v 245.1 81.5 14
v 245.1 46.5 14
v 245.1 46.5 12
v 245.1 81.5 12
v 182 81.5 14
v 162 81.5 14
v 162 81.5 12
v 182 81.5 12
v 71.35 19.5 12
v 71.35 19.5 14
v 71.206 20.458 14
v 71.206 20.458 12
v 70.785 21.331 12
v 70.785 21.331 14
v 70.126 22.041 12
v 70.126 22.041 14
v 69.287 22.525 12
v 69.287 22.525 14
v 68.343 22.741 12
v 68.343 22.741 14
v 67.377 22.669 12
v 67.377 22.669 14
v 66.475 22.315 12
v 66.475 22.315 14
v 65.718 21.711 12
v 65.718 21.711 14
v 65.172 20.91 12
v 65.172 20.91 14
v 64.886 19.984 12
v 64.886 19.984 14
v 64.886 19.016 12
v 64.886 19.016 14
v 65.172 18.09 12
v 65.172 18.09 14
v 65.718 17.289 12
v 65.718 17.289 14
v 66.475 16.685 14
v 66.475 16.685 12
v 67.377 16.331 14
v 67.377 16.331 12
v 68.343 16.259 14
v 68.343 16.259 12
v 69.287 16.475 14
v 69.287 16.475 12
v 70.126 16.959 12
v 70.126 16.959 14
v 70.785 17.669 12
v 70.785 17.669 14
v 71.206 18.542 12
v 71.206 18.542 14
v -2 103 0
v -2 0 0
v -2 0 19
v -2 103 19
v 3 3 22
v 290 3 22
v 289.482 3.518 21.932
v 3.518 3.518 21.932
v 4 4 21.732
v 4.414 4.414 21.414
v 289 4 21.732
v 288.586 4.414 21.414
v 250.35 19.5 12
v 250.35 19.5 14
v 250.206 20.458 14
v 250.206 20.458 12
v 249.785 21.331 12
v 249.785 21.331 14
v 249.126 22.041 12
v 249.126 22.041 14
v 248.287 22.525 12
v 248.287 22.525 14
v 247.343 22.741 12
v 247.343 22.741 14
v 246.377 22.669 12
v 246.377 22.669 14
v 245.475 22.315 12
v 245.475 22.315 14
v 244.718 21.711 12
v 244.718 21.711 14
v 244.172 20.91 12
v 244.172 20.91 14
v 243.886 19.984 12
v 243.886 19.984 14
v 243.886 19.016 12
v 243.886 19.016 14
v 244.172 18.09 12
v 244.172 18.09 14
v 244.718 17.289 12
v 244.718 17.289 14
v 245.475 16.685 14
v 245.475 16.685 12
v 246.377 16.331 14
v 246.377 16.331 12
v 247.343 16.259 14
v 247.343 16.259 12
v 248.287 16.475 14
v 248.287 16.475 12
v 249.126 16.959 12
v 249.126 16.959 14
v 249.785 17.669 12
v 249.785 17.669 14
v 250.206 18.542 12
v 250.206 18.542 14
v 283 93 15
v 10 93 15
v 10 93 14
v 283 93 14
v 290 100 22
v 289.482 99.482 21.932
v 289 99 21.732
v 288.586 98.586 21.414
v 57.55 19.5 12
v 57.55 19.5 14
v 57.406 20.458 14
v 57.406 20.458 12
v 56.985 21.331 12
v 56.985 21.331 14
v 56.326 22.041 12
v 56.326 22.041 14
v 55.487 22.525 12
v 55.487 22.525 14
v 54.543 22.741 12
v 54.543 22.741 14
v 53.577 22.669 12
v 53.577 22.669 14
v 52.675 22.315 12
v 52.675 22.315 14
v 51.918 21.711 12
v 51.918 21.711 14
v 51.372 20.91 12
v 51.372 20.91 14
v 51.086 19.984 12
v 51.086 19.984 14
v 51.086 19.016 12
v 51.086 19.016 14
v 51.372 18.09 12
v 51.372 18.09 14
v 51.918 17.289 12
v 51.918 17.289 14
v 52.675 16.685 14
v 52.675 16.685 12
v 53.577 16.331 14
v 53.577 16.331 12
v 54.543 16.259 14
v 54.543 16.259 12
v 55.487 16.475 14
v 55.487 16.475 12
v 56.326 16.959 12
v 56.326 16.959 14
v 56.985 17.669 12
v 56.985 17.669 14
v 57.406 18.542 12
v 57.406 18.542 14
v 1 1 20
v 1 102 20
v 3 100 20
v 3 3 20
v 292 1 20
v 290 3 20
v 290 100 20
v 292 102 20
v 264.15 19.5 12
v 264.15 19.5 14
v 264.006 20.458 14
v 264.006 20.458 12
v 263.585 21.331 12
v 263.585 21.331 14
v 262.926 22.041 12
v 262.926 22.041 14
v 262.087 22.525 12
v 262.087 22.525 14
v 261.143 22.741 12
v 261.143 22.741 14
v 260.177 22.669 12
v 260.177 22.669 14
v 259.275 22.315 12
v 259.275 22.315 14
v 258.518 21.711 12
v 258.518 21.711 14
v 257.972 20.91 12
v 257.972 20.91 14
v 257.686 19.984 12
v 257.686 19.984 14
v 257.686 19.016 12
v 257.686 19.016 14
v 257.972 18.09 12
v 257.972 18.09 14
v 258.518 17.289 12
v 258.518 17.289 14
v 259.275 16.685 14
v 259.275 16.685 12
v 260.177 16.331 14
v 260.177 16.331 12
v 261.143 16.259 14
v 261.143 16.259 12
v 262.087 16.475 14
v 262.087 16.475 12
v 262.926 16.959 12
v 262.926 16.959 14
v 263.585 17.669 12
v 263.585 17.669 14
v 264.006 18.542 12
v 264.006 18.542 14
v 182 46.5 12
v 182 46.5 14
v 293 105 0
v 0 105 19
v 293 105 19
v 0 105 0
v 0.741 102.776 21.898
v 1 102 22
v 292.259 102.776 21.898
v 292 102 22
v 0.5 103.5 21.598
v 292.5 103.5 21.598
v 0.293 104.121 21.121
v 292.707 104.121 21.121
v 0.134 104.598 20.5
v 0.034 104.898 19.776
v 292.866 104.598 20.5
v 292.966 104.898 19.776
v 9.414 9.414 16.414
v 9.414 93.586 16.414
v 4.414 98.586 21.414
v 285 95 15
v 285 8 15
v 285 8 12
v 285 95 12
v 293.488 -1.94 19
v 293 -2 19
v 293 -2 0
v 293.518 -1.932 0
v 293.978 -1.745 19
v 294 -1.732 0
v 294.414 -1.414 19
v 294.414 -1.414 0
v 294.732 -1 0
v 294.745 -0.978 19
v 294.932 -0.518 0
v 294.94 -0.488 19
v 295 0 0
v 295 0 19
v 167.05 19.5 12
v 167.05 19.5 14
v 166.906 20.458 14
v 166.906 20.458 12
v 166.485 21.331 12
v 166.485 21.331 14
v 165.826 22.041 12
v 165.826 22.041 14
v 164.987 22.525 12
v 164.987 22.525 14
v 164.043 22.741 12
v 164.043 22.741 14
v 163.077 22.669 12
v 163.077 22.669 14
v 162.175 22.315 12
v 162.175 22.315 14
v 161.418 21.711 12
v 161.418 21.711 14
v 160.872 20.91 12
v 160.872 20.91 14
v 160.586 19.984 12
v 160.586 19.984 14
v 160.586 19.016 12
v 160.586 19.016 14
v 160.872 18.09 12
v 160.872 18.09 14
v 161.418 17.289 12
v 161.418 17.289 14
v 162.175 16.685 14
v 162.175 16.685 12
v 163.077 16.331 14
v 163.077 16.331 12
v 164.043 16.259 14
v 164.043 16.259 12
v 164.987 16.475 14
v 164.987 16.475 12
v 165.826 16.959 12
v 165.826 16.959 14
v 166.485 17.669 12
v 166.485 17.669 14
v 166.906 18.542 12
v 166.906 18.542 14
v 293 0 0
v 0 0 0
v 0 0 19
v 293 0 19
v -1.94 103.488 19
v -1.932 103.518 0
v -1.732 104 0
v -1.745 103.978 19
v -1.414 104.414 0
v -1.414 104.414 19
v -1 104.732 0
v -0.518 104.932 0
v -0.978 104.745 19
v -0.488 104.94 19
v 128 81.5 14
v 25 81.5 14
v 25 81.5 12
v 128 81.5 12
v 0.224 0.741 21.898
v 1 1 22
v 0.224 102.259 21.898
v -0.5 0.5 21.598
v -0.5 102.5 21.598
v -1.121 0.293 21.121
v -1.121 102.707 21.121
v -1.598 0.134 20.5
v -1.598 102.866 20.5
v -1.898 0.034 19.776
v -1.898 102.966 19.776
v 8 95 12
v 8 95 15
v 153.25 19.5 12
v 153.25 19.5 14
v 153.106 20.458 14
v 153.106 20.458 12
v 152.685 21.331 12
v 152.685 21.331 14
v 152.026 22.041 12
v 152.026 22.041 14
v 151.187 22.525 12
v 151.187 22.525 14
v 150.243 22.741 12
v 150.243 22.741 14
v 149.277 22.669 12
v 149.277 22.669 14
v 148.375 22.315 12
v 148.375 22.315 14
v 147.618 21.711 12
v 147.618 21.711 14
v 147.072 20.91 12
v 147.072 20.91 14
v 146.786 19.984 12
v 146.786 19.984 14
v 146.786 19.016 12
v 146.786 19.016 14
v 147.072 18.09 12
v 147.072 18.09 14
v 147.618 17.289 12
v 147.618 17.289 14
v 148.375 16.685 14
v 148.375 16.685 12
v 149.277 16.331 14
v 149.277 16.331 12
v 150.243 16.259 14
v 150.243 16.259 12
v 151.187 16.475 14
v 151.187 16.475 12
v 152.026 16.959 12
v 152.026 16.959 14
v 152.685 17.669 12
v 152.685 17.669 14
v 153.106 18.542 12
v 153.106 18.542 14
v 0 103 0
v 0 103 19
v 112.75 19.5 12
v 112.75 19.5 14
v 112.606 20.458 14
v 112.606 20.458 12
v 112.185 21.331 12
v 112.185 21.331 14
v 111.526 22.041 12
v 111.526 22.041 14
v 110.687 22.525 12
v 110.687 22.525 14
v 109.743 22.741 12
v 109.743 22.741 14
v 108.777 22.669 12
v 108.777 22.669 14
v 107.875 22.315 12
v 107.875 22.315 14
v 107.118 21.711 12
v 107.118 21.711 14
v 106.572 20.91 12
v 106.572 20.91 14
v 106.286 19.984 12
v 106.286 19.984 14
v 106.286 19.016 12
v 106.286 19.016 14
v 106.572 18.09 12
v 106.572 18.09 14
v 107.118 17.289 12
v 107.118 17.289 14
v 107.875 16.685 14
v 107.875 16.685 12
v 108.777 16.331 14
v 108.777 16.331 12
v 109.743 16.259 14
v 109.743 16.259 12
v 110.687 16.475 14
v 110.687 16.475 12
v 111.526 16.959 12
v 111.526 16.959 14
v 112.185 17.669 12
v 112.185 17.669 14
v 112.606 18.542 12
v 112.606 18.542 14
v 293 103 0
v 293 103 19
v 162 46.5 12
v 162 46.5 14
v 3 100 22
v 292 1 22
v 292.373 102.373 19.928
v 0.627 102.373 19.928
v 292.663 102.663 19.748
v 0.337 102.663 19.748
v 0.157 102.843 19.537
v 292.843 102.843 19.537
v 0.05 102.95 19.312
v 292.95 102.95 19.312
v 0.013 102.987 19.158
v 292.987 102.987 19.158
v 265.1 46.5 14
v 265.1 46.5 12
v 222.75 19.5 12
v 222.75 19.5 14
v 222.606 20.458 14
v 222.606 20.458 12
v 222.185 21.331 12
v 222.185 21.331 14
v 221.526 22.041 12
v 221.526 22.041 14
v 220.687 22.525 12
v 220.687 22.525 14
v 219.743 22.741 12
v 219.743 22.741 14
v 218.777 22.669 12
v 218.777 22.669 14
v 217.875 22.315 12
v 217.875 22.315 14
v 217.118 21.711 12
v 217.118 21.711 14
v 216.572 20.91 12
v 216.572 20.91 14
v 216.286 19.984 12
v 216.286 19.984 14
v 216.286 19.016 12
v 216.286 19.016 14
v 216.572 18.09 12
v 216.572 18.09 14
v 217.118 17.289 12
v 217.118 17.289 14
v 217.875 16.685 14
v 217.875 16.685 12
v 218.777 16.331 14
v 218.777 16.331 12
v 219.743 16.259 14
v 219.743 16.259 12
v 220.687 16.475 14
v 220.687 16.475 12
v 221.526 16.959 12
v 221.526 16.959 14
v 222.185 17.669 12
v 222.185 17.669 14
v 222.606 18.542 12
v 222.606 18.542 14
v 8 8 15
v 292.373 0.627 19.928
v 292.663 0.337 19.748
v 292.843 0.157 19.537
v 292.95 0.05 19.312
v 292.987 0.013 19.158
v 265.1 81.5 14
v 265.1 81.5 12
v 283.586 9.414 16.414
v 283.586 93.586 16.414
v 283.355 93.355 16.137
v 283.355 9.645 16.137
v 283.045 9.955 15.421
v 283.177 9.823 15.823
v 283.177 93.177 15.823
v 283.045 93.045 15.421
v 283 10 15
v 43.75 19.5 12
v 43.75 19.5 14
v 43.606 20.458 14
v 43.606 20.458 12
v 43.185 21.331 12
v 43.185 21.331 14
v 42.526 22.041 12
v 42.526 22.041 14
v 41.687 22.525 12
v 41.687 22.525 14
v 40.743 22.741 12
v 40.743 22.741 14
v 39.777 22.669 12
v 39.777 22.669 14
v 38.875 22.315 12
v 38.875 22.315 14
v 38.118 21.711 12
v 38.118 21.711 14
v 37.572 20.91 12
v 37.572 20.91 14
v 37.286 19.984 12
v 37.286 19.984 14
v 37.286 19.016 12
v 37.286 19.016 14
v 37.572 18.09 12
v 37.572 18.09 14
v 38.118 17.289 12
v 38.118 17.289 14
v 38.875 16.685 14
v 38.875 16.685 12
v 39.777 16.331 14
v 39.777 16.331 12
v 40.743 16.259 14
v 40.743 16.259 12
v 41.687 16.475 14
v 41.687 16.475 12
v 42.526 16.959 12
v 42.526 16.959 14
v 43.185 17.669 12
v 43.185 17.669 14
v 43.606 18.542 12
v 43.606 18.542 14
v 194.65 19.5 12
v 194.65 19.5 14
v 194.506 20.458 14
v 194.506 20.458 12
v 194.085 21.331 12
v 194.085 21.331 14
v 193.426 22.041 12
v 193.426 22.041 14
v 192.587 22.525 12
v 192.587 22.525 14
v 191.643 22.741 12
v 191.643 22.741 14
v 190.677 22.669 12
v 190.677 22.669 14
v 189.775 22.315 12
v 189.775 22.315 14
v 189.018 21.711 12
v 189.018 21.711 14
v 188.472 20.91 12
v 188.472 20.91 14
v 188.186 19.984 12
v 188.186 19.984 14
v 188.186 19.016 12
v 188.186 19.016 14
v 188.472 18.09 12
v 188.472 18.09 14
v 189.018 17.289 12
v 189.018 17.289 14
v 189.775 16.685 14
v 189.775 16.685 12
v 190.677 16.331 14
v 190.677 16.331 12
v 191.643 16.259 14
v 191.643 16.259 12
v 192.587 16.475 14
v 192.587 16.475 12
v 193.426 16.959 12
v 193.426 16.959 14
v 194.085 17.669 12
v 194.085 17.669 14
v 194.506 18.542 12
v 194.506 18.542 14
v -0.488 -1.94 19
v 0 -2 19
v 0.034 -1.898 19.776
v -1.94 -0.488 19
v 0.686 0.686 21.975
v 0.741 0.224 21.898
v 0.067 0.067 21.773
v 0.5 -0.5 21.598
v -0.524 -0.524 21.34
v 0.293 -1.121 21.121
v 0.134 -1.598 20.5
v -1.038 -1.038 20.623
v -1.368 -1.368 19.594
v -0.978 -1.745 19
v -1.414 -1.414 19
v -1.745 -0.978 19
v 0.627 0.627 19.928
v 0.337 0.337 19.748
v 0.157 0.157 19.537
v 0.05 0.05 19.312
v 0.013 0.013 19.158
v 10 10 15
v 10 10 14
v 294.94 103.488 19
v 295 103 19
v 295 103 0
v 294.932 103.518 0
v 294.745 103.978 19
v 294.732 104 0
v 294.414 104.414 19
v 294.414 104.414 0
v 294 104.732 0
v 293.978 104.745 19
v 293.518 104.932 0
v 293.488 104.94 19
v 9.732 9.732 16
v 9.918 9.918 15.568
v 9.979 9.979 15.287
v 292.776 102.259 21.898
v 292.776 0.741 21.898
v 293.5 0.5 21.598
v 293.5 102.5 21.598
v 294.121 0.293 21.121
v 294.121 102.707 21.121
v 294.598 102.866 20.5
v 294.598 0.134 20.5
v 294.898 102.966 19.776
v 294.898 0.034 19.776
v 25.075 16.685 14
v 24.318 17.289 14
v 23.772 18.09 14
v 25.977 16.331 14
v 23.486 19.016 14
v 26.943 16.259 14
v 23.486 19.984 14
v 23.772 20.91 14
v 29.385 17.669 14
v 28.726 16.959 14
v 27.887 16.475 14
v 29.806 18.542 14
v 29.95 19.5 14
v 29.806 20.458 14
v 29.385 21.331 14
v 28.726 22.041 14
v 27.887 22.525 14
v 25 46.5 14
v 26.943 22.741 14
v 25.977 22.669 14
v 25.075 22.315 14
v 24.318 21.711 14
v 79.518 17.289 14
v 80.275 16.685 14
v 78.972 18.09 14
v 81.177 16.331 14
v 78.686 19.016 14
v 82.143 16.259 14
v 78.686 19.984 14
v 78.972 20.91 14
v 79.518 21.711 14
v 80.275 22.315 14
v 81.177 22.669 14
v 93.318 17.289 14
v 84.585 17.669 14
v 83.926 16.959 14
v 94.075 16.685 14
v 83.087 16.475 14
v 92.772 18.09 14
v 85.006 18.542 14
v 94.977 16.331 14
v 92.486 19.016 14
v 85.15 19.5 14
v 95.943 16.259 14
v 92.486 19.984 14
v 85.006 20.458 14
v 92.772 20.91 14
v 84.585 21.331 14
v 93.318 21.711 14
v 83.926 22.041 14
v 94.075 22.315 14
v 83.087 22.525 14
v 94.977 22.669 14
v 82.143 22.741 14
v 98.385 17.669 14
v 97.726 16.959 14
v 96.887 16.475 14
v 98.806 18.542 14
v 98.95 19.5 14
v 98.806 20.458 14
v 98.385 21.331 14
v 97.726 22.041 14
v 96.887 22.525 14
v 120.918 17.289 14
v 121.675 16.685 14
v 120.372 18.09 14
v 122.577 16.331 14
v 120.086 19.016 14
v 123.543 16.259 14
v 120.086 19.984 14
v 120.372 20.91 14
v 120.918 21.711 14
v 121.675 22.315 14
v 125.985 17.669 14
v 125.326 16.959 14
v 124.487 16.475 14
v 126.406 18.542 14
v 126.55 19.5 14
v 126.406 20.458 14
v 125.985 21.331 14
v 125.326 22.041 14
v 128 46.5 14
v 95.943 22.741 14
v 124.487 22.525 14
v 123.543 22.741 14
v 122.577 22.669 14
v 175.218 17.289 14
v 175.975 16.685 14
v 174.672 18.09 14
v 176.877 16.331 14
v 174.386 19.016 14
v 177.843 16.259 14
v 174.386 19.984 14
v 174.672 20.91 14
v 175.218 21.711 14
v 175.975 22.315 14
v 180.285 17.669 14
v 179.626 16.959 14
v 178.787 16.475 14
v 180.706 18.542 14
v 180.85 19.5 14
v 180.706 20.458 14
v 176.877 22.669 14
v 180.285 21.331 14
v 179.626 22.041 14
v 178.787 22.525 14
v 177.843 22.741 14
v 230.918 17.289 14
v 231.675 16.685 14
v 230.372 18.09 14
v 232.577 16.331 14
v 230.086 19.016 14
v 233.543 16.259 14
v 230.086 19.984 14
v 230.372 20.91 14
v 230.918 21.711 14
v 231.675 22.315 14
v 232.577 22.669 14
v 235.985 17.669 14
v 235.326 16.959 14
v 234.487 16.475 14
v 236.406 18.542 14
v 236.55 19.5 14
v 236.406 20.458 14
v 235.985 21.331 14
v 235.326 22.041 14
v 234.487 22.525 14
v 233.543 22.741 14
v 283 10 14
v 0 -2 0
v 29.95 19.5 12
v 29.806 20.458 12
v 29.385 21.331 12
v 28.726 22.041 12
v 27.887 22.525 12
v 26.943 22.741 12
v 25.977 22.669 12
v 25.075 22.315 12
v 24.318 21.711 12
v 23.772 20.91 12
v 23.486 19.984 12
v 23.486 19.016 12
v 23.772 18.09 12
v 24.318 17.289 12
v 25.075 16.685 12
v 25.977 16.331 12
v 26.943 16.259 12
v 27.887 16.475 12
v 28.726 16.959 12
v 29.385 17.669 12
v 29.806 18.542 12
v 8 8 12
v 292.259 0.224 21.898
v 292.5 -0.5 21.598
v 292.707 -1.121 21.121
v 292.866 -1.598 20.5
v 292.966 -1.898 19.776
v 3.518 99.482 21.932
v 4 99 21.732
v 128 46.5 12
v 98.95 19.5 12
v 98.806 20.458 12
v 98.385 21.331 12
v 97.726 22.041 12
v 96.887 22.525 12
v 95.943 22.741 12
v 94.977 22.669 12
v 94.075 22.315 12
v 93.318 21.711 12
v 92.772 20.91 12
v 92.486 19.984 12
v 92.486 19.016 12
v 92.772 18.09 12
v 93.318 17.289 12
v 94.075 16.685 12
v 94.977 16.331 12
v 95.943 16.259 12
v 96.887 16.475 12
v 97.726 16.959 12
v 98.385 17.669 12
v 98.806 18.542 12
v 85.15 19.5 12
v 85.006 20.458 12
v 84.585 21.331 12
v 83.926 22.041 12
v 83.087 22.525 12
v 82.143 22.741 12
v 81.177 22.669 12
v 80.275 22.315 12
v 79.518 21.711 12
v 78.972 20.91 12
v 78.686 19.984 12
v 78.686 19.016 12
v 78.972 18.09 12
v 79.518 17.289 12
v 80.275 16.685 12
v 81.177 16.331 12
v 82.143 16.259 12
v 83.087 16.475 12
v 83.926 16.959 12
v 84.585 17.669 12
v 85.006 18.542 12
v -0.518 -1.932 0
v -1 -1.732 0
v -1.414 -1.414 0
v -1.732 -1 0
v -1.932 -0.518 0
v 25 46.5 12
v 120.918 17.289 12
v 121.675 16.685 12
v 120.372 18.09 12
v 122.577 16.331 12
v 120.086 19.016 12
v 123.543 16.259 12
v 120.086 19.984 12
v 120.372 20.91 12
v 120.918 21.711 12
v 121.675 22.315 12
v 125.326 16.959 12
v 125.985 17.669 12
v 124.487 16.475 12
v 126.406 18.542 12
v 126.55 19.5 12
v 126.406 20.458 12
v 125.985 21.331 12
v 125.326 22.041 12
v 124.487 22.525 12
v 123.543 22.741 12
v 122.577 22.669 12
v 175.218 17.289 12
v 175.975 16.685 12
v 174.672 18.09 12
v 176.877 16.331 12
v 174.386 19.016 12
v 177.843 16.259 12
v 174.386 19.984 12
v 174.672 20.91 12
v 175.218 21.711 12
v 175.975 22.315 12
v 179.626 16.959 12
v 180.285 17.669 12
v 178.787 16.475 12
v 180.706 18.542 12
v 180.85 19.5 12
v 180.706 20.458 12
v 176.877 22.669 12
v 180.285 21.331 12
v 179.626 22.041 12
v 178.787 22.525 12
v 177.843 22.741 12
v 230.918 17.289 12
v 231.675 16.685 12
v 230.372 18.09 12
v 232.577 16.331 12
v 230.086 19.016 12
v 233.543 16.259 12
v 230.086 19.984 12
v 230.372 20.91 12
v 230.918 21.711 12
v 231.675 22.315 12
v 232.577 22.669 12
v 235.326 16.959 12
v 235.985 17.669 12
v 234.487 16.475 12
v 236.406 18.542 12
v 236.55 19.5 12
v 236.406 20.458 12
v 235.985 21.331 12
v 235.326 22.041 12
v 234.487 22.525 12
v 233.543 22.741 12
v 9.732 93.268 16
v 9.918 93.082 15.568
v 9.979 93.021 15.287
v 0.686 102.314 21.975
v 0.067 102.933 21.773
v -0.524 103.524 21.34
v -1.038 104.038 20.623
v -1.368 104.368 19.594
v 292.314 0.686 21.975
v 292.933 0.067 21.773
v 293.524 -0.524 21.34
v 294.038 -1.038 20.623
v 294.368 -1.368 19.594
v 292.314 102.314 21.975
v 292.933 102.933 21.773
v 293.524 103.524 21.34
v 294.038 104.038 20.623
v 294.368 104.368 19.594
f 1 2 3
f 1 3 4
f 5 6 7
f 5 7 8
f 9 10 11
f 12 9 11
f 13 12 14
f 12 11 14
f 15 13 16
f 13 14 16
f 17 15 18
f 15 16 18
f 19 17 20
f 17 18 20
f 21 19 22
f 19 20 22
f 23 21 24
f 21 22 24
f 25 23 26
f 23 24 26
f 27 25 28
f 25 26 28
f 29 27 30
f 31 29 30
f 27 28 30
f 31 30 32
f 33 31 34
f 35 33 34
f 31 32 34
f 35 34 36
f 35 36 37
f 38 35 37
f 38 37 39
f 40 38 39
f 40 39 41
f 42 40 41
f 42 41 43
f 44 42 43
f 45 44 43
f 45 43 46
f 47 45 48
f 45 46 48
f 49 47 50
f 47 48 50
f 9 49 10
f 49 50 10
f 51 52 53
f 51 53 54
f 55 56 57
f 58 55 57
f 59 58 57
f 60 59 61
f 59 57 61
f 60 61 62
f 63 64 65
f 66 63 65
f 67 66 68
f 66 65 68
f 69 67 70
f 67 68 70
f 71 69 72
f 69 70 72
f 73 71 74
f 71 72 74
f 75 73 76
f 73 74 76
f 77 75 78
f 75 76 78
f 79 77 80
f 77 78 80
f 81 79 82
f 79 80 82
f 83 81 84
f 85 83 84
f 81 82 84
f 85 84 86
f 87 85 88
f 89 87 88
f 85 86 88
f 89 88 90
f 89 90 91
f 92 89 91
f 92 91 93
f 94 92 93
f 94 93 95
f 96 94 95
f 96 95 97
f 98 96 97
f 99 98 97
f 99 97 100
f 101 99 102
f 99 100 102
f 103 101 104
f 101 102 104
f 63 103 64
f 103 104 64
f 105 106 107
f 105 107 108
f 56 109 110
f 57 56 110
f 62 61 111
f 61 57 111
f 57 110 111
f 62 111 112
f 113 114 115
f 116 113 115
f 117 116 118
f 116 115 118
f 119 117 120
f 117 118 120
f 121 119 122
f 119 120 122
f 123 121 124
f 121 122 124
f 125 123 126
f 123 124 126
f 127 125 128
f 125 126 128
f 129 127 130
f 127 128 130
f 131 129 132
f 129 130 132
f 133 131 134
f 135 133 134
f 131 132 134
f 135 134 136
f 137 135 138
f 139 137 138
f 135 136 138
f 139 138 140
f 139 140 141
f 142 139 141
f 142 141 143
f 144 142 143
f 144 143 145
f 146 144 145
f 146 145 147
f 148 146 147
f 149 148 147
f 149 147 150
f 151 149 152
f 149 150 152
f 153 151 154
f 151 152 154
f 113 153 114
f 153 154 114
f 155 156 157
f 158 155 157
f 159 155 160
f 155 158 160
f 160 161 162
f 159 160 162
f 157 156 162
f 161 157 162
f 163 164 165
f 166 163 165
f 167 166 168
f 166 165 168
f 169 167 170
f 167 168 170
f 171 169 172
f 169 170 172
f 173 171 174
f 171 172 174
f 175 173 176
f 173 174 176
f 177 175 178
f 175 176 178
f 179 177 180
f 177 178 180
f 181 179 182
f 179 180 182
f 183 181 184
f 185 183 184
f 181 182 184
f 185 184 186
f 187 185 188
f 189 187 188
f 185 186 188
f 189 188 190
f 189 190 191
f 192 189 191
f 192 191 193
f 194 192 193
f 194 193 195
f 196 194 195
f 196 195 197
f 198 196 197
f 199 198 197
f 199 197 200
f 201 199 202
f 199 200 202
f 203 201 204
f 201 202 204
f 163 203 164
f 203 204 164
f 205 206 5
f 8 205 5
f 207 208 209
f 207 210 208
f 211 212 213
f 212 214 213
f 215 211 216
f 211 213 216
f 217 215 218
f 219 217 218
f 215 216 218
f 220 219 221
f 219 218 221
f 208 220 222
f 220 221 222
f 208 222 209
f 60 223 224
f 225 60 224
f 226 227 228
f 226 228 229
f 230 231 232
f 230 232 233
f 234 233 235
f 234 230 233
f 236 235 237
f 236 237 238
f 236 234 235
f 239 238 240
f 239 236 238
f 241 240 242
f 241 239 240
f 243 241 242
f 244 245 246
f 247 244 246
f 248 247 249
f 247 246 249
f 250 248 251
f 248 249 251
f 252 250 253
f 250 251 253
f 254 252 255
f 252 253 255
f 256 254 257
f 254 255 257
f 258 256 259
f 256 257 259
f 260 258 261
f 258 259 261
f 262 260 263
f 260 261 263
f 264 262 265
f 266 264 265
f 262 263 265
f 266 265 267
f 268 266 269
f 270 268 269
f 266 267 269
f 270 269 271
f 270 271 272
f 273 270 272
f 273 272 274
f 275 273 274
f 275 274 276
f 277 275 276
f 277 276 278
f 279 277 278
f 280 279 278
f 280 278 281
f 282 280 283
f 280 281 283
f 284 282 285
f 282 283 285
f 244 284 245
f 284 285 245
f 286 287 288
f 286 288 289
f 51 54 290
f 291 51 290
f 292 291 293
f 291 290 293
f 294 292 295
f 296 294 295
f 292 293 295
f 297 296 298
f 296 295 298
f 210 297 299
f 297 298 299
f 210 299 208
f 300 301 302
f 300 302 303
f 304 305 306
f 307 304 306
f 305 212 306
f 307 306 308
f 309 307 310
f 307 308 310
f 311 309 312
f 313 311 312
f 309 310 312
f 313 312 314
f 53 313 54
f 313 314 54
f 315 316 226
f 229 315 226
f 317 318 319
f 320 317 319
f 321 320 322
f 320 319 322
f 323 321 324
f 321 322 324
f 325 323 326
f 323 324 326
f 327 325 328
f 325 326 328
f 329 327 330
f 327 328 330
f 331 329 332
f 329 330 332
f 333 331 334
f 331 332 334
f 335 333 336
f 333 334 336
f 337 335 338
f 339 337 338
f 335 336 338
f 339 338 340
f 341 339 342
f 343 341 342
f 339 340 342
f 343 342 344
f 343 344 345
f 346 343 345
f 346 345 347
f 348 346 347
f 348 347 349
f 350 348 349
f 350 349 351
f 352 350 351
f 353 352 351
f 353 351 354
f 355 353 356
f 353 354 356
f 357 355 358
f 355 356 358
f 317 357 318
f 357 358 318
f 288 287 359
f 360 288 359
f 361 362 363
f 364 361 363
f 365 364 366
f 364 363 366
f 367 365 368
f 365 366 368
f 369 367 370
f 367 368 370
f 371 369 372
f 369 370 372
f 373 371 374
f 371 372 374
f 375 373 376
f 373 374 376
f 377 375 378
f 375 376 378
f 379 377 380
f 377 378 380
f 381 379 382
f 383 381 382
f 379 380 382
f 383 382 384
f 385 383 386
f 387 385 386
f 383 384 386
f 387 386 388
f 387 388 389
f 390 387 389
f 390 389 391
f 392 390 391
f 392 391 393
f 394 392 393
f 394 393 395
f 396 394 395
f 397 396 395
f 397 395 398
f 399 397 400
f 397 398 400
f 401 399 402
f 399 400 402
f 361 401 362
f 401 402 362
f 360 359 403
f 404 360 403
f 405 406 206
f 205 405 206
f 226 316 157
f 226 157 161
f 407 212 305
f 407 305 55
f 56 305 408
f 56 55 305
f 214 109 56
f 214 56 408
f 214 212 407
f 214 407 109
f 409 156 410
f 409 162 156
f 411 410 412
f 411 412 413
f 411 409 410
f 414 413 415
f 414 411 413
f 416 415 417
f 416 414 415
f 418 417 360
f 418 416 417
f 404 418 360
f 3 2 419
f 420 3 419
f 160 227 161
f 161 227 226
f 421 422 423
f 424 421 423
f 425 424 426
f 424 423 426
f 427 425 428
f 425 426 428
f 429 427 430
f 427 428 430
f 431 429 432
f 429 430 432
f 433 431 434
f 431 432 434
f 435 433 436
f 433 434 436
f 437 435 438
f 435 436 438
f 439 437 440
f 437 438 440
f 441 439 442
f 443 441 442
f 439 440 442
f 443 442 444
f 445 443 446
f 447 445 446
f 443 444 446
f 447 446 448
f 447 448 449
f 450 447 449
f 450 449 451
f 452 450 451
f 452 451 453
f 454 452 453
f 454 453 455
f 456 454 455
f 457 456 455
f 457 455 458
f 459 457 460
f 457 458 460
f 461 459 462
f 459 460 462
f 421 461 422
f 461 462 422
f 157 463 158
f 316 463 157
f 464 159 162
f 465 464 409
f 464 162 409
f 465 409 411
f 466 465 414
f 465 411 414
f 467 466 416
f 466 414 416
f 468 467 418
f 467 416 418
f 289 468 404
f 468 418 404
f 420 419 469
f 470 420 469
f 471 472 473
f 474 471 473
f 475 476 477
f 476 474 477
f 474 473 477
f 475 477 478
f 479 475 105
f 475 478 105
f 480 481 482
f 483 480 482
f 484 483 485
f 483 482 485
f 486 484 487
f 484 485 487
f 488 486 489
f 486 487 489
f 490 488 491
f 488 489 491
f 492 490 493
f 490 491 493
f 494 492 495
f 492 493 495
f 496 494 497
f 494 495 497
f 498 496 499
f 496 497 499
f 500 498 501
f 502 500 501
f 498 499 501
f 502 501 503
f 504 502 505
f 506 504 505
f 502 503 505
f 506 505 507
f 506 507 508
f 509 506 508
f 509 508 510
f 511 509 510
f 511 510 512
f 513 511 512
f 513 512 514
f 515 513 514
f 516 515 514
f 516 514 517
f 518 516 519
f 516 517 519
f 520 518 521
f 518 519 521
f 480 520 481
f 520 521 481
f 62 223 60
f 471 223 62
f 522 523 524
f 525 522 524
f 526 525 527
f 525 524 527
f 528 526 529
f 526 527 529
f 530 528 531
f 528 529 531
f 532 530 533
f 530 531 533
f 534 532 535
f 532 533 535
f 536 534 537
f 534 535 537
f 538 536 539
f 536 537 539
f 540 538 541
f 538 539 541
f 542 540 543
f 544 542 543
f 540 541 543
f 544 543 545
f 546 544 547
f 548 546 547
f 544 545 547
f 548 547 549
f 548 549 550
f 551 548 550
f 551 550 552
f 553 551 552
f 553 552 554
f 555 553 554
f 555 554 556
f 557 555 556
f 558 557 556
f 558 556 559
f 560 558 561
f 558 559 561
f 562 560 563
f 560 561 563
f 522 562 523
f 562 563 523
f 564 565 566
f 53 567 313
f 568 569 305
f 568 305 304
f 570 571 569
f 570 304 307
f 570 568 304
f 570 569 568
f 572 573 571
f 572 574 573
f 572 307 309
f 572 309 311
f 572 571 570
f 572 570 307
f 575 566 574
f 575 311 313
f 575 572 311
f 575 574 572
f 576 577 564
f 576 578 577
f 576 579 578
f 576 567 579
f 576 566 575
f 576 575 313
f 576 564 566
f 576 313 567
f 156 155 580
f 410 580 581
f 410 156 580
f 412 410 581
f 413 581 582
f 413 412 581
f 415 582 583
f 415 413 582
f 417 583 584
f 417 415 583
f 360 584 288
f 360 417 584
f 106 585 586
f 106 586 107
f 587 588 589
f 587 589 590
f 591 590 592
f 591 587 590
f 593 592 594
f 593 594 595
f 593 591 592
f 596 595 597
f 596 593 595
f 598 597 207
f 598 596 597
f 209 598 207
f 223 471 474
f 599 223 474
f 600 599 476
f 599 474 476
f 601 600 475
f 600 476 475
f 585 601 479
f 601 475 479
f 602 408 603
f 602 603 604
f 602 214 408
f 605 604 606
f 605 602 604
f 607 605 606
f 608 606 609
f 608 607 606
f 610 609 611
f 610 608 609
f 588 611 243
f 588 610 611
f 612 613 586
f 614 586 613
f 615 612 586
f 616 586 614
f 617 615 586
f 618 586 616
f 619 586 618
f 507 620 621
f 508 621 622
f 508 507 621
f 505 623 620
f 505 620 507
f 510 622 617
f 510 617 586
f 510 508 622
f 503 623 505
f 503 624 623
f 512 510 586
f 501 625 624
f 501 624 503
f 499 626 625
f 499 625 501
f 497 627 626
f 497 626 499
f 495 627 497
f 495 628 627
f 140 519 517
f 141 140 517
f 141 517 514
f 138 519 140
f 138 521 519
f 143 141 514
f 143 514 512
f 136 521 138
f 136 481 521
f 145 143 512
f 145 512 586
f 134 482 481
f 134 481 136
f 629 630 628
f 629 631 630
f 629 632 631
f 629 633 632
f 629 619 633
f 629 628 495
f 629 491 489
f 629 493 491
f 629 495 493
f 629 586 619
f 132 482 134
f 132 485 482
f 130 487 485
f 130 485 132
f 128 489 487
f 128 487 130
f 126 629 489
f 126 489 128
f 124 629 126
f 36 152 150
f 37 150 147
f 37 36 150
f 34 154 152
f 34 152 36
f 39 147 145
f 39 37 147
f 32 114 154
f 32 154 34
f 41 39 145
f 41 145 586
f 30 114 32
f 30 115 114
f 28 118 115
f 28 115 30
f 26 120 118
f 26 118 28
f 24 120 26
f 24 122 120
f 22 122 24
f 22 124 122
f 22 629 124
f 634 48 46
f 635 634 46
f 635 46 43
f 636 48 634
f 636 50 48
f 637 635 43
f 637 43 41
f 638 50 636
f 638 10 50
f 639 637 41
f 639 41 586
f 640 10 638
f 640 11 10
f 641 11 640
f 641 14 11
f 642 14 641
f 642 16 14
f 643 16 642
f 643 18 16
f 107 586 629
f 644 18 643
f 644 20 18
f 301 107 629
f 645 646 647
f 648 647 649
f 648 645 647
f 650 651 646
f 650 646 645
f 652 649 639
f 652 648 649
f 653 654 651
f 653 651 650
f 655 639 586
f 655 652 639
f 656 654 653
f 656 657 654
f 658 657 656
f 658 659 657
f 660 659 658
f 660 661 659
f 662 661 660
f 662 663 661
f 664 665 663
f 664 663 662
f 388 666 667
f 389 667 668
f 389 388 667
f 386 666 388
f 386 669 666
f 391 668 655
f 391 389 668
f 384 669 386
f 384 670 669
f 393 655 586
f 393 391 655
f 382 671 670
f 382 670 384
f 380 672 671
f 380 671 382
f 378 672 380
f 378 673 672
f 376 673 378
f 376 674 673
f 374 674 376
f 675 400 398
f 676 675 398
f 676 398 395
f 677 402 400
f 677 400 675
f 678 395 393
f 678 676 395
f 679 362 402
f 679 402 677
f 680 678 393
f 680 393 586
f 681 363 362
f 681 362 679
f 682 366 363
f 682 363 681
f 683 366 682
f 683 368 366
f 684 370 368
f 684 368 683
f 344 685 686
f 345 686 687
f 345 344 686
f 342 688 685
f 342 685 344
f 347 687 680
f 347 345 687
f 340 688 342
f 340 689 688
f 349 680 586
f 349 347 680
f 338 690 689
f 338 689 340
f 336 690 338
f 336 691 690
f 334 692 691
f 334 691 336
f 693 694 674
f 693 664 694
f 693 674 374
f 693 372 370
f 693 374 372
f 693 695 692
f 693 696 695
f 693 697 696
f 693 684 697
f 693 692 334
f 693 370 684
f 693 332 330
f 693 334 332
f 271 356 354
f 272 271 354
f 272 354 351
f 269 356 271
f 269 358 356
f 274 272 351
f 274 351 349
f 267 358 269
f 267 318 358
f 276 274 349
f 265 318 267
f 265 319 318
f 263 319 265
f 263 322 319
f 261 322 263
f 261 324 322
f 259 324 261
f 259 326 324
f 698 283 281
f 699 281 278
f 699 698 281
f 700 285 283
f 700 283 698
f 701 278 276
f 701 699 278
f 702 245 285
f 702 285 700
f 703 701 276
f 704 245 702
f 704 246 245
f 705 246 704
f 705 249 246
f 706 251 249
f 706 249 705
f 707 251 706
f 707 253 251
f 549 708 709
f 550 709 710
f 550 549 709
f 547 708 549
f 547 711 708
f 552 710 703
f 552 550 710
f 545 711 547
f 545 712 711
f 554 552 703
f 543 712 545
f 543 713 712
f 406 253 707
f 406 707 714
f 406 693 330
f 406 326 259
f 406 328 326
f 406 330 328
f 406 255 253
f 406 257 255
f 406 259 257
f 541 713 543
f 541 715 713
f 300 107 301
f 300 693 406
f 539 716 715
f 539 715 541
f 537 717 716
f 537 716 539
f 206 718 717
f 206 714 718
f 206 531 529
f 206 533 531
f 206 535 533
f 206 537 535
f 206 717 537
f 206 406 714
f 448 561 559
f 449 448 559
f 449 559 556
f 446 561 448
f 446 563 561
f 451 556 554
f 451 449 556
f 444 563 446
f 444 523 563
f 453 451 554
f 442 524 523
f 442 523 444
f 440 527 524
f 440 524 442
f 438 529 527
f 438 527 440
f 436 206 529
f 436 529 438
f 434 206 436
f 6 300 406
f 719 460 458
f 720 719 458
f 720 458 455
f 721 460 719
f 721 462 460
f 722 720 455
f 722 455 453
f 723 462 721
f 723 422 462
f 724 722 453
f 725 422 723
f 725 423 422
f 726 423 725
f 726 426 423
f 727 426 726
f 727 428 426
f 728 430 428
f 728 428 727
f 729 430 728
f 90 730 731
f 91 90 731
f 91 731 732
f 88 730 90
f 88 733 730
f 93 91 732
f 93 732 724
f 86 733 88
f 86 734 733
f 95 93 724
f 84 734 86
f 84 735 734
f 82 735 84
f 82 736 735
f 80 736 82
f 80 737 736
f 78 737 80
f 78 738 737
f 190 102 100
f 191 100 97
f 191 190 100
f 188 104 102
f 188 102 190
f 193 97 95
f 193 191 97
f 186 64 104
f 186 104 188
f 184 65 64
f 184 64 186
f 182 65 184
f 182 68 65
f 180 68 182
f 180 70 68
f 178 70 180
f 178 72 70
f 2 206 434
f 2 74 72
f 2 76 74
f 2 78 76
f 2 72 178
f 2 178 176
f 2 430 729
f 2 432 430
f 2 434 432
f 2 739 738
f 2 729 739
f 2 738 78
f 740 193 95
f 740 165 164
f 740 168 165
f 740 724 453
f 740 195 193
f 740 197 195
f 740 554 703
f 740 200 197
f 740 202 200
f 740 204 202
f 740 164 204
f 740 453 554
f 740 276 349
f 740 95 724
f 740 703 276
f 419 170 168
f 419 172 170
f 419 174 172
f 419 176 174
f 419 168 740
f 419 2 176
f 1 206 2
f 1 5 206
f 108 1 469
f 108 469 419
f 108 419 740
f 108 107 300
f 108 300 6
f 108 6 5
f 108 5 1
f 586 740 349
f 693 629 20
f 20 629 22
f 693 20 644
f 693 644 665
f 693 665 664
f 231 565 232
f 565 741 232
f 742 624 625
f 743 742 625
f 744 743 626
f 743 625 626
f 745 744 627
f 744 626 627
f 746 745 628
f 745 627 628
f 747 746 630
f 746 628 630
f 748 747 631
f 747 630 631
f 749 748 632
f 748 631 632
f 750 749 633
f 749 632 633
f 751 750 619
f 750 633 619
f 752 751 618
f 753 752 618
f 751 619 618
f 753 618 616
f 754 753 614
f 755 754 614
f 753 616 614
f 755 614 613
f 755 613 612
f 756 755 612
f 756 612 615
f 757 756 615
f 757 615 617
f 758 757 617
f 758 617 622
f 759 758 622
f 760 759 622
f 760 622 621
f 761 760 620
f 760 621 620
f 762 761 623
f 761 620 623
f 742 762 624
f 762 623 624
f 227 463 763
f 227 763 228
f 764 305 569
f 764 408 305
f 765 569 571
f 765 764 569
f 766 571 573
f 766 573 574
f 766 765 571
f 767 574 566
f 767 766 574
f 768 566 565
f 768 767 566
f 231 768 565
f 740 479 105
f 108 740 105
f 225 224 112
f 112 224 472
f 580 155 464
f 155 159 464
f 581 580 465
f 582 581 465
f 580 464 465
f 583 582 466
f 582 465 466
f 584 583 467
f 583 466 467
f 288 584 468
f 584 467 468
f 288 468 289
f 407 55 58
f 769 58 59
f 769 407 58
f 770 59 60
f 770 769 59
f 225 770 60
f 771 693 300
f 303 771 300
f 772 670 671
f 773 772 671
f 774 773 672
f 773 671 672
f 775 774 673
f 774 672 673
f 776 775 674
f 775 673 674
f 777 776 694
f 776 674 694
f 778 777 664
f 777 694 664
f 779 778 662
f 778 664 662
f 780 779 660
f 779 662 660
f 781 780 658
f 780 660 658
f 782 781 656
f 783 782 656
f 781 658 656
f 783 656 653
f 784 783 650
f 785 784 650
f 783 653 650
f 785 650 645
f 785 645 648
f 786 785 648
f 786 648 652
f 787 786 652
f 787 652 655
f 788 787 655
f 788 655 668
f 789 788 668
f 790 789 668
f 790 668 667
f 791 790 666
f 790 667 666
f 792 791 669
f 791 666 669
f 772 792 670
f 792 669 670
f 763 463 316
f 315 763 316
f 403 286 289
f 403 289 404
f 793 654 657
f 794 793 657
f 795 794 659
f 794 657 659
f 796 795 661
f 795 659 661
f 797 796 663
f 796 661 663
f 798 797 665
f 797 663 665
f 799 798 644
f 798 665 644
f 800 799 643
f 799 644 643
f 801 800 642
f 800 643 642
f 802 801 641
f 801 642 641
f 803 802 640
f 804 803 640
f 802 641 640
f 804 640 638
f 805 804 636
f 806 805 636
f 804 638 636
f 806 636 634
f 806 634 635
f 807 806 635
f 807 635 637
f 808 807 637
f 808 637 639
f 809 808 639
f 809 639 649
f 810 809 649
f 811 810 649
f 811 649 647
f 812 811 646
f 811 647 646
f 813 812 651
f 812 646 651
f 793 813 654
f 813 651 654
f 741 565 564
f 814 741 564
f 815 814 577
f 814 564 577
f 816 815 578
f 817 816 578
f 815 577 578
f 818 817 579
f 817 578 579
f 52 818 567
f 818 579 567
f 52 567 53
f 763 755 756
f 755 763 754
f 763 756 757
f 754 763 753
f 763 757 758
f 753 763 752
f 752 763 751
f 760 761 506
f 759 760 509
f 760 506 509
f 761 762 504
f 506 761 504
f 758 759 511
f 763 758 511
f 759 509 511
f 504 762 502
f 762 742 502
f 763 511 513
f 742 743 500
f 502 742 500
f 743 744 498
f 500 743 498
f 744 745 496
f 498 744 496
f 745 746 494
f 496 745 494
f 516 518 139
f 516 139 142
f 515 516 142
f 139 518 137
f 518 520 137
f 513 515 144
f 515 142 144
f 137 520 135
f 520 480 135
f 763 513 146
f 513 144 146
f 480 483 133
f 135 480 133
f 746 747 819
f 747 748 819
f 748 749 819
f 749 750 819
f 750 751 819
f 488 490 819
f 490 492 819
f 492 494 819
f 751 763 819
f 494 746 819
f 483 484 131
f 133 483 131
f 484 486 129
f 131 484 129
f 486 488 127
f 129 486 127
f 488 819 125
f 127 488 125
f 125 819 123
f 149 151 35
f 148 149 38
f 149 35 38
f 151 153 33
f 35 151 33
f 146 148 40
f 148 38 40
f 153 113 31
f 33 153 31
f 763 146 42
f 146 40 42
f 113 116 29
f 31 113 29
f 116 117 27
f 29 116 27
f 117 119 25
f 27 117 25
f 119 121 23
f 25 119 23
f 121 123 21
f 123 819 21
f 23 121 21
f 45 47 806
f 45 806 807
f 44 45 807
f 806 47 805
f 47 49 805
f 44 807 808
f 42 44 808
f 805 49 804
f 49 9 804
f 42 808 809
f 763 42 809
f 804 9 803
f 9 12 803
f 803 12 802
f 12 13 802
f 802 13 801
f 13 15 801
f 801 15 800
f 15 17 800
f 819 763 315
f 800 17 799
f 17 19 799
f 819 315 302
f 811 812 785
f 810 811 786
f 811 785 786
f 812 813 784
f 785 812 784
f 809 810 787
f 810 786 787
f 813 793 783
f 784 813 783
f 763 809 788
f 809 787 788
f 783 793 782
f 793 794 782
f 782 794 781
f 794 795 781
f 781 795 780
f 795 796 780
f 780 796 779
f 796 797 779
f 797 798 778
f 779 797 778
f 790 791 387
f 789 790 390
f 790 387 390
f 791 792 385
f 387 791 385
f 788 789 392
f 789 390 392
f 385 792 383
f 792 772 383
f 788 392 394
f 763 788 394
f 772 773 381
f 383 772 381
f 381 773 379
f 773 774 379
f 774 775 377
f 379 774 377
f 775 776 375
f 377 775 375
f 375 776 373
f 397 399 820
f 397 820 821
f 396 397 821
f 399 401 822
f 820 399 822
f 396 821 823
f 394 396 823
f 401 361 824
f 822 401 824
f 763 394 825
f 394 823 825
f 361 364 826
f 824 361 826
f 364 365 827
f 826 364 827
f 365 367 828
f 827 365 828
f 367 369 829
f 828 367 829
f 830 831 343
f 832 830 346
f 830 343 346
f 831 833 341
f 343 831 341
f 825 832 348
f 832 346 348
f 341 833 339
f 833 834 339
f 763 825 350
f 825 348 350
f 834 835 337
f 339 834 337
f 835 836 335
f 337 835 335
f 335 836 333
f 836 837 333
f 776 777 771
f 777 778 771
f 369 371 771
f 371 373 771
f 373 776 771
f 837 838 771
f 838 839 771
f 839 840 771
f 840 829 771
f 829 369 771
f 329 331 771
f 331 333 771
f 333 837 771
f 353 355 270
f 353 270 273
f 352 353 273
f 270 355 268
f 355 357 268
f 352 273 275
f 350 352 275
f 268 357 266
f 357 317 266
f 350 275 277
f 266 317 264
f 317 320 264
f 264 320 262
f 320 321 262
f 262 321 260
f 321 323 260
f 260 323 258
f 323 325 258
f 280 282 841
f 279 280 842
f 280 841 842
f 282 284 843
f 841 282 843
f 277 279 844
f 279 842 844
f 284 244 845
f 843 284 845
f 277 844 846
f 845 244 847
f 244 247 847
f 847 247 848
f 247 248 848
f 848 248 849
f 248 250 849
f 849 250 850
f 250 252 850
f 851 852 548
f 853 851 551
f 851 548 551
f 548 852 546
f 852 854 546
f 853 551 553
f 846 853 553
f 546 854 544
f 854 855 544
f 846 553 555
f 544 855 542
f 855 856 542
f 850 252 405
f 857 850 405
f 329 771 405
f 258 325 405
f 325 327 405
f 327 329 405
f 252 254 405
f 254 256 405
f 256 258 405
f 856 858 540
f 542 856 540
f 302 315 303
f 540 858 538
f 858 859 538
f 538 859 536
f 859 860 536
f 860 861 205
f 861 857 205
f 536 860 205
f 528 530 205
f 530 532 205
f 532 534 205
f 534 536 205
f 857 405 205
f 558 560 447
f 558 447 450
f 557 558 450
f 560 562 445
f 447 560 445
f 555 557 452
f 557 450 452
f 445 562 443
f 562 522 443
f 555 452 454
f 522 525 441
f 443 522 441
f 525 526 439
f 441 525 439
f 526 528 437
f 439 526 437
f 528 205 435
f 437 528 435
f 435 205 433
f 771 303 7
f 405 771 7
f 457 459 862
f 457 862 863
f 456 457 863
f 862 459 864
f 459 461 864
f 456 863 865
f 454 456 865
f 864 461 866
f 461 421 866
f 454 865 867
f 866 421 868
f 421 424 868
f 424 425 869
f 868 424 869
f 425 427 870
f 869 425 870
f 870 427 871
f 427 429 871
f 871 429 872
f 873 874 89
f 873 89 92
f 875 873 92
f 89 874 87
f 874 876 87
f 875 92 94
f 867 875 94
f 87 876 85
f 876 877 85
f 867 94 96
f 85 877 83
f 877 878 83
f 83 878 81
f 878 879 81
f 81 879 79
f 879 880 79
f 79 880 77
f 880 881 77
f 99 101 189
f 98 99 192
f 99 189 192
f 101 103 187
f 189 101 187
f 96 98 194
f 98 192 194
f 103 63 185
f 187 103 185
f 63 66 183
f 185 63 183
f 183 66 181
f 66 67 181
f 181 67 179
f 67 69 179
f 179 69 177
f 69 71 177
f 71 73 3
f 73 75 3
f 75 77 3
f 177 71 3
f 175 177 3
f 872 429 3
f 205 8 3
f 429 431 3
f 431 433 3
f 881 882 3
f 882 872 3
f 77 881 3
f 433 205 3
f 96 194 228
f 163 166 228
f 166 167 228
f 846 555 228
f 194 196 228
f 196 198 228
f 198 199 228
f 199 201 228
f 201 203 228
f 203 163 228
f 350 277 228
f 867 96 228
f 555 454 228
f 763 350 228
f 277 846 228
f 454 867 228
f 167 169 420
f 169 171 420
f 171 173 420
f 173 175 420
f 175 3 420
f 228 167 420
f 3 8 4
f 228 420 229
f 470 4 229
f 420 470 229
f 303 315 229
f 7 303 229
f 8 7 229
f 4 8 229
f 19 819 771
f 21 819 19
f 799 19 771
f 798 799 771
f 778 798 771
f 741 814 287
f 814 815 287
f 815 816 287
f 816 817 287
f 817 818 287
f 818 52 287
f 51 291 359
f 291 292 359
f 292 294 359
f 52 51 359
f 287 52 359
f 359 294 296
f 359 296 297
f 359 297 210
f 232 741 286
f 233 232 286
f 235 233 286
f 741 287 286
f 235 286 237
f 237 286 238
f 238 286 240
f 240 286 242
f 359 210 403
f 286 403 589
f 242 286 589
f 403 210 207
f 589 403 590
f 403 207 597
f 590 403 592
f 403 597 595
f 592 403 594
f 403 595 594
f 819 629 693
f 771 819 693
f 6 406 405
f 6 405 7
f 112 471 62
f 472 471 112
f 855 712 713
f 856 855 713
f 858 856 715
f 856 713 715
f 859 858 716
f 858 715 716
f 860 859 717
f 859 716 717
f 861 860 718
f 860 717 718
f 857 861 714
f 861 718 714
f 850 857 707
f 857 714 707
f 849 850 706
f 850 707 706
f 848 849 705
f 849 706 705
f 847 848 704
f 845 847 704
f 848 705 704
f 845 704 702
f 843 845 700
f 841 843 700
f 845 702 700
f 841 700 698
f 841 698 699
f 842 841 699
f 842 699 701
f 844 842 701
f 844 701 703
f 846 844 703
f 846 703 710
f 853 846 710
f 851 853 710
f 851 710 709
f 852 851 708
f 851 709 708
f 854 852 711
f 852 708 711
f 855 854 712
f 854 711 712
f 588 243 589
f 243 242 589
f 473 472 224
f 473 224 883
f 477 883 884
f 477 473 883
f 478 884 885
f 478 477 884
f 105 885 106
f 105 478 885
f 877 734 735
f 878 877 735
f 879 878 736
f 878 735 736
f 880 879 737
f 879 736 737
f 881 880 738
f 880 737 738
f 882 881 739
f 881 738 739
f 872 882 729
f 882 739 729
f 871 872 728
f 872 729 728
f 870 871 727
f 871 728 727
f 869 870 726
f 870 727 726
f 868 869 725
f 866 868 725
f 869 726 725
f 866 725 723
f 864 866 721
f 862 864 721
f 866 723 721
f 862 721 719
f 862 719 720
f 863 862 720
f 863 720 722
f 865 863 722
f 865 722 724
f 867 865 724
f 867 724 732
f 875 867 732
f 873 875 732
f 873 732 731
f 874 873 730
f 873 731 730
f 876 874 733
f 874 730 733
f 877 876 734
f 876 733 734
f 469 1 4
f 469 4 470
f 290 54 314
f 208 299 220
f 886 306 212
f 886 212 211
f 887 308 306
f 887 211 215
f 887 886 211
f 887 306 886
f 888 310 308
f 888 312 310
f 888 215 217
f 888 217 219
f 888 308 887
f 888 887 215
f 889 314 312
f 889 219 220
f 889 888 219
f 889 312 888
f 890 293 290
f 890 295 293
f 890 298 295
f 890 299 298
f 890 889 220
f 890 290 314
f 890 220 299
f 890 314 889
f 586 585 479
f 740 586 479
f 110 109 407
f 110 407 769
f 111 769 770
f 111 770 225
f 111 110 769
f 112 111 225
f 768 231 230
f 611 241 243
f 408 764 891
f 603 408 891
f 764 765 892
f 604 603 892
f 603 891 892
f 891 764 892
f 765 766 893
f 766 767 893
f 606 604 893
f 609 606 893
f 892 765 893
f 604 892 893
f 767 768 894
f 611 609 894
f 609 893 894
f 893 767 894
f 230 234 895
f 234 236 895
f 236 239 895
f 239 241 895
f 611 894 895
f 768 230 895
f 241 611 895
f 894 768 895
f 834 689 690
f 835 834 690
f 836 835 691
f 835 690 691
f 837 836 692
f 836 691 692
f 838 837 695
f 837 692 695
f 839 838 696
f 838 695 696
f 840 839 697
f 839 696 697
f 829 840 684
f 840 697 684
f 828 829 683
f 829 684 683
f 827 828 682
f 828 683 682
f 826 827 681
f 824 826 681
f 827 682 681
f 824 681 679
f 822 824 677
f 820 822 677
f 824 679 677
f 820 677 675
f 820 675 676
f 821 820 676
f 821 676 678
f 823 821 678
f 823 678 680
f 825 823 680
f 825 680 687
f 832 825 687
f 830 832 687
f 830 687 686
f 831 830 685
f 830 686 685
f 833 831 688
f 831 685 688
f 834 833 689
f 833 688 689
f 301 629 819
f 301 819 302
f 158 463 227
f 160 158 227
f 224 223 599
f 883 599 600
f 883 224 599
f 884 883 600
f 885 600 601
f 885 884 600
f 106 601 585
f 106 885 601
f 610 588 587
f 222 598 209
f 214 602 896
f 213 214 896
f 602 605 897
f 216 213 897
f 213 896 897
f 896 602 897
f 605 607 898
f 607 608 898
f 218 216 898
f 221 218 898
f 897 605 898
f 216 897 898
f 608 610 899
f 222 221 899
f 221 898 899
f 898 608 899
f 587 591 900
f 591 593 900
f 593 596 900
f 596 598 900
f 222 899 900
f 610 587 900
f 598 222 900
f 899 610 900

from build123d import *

# Parameters (mm, degrees)
SKETCH_W        = 293
SKETCH_H        = 103
PAD_DEPTH       = 20
SKETCH001_W     = 277
SKETCH001_H     = 87
POCKET_DEPTH    = 8
CHAMFER_SIZE    = 5
FILLET_R        = 1
THICKNESS_T     = 2
SKETCH003_W     = 103
SKETCH003_H     = 35
SKETCH003_W_2   = 20
POCKET002_DEPTH = 5
SKETCH004_R     = 3.25
POCKET003_DEPTH = 2


with BuildPart() as part:
    # Sketch → Pad (new body)
    with BuildSketch(Plane.XY):
        with Locations((146.5, 51.5)):
            Rectangle(SKETCH_W, SKETCH_H)
    extrude(amount=PAD_DEPTH)

    # Sketch001 (on Face6 of Pad) → Pocket (cut)
    with BuildSketch(Plane.XY.offset(20)):
        with Locations((146.5, 51.5)):
            Rectangle(SKETCH001_W, SKETCH001_H)
    extrude(amount=-POCKET_DEPTH, mode=Mode.SUBTRACT)

    # Chamfer
    chamfer_edges = [part.edges().sort_by_distance(p)[0] for p in [
        (8, 51.5, 20),
        (146.5, 95, 20),
        (146.5, 8, 20),
        (285, 51.5, 20),
    ]]
    chamfer(chamfer_edges, length=CHAMFER_SIZE)

    # Fillet
    fillet_edges = [part.edges().sort_by_distance(p)[0] for p in [
        (146.5, 0, 20),
        (0, 51.5, 20),
        (146.5, 103, 20),
        (293, 51.5, 20),
    ]]
    fillet(fillet_edges, radius=FILLET_R)

    # Thickness
    thickness_openings = [part.faces().sort_by_distance(p)[0] for p in [
        (146.5, 51.5, 0),
    ]]
    offset(amount=THICKNESS_T, openings=thickness_openings)

    # Sketch003 → Pocket002 (cut)
    with BuildSketch(Plane.XY.offset(14)):
        with Locations((76.5, 64)):
            Rectangle(SKETCH003_W, SKETCH003_H)
        with Locations((172, 64)):
            Rectangle(SKETCH003_W_2, SKETCH003_H)
        with Locations((255.1, 64)):
            Rectangle(SKETCH003_W_2, SKETCH003_H)
    extrude(amount=-POCKET002_DEPTH, mode=Mode.SUBTRACT)

    # Sketch004 (on Face48 of Pocket002) → Pocket003 (cut)
    with BuildSketch(Plane.XY.offset(14)):
        with Locations((26.7, 19.5)):
            Circle(SKETCH004_R)
        with Locations((40.5, 19.5)):
            Circle(SKETCH004_R)
        with Locations((54.3, 19.5)):
            Circle(SKETCH004_R)
        with Locations((68.1, 19.5)):
            Circle(SKETCH004_R)
        with Locations((81.9, 19.5)):
            Circle(SKETCH004_R)
        with Locations((95.7, 19.5)):
            Circle(SKETCH004_R)
        with Locations((109.5, 19.5)):
            Circle(SKETCH004_R)
        with Locations((123.3, 19.5)):
            Circle(SKETCH004_R)
        with Locations((150, 19.5)):
            Circle(SKETCH004_R)
        with Locations((163.8, 19.5)):
            Circle(SKETCH004_R)
        with Locations((177.6, 19.5)):
            Circle(SKETCH004_R)
        with Locations((191.4, 19.5)):
            Circle(SKETCH004_R)
        with Locations((219.5, 19.5)):
            Circle(SKETCH004_R)
        with Locations((233.3, 19.5)):
            Circle(SKETCH004_R)
        with Locations((247.1, 19.5)):
            Circle(SKETCH004_R)
        with Locations((260.9, 19.5)):
            Circle(SKETCH004_R)
    extrude(amount=-POCKET003_DEPTH, mode=Mode.SUBTRACT)


solid = part.part
